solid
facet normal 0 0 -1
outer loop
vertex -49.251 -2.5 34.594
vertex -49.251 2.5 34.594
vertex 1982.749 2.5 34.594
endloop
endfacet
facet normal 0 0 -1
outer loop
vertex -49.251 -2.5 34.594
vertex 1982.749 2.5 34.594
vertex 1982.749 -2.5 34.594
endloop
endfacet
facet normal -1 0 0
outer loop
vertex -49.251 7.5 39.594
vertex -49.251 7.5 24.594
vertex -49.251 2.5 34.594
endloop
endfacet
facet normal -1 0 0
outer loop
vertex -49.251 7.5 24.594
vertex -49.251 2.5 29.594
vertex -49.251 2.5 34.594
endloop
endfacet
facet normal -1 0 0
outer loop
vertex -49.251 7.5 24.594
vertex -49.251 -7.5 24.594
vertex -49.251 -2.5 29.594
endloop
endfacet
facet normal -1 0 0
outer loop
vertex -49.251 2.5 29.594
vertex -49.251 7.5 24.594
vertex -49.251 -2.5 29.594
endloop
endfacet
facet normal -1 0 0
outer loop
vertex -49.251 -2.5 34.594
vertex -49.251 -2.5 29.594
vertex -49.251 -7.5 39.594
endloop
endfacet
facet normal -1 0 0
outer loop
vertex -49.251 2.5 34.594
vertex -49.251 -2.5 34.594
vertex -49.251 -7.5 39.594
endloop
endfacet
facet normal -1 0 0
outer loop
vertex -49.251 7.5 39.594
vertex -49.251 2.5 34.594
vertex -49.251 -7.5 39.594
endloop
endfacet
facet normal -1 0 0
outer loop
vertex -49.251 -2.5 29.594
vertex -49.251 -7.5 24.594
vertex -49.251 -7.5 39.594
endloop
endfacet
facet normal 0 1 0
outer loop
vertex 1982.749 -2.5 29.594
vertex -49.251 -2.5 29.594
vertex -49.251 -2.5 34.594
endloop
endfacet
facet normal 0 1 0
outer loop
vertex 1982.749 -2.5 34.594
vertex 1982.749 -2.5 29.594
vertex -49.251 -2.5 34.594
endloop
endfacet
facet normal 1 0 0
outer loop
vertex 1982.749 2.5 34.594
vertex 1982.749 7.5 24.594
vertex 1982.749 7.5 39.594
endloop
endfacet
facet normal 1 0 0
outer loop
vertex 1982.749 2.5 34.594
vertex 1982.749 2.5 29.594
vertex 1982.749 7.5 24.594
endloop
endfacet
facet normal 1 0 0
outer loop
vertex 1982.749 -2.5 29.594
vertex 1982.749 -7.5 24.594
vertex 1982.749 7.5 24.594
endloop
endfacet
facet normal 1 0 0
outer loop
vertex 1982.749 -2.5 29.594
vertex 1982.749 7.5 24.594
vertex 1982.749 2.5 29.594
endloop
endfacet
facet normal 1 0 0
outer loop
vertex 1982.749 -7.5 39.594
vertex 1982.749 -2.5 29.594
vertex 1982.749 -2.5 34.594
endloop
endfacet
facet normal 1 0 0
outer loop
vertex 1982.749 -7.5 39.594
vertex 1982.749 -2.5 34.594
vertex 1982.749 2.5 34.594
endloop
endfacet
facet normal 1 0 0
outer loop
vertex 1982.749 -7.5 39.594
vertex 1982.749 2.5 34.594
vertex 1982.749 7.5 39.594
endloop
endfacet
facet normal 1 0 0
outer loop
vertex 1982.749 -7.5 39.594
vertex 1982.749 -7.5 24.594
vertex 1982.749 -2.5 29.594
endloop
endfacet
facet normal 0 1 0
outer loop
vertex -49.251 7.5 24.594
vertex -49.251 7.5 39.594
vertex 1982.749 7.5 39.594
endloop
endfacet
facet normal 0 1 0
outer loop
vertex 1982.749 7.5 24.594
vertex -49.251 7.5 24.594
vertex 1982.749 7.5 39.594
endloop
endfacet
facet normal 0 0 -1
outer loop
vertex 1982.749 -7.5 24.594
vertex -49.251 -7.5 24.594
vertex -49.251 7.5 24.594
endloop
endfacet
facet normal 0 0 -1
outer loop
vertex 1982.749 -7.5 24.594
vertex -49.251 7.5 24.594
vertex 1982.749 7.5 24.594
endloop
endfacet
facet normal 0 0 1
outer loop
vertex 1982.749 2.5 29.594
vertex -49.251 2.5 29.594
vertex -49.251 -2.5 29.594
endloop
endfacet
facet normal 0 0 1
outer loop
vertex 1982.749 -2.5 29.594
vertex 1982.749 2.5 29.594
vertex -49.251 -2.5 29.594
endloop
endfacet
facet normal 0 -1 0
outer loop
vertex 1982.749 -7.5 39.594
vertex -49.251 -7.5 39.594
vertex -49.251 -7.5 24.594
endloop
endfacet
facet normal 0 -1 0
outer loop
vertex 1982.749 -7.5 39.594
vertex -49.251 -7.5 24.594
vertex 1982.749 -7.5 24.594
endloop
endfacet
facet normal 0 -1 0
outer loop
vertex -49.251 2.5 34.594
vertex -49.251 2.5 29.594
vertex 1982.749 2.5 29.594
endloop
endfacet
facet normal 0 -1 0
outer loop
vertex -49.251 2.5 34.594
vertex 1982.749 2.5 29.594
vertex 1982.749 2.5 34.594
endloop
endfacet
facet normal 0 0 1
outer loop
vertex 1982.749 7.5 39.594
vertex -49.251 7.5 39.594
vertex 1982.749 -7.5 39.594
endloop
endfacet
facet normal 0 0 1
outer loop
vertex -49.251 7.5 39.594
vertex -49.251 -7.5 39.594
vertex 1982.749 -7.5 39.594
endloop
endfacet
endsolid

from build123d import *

# Parameters (mm, degrees)
F0_W     = 2032
F0_H     = 15
F1_DEPTH = 7.5
F2_W     = 5
F2_H     = 5
F3_DEPTH = 2032


with BuildPart() as f1:
    # F0 (on Front) → F1 (new body, symmetric)
    with BuildSketch(Plane.XZ):
        with Locations((966.749246, 32.093956)):
            Rectangle(F0_W, F0_H)
    extrude(amount=F1_DEPTH, both=True)

    # F2 (on face) → F3 (cut)
    with BuildSketch(Plane(origin=(-49.250754, 0, 0), x_dir=(0, -1, 0), z_dir=(-1, 0, 0))):
        with Locations((0, 32.093956)):
            Rectangle(F2_W, F2_H)
    extrude(amount=-F3_DEPTH, mode=Mode.SUBTRACT)


solid = f1.part
